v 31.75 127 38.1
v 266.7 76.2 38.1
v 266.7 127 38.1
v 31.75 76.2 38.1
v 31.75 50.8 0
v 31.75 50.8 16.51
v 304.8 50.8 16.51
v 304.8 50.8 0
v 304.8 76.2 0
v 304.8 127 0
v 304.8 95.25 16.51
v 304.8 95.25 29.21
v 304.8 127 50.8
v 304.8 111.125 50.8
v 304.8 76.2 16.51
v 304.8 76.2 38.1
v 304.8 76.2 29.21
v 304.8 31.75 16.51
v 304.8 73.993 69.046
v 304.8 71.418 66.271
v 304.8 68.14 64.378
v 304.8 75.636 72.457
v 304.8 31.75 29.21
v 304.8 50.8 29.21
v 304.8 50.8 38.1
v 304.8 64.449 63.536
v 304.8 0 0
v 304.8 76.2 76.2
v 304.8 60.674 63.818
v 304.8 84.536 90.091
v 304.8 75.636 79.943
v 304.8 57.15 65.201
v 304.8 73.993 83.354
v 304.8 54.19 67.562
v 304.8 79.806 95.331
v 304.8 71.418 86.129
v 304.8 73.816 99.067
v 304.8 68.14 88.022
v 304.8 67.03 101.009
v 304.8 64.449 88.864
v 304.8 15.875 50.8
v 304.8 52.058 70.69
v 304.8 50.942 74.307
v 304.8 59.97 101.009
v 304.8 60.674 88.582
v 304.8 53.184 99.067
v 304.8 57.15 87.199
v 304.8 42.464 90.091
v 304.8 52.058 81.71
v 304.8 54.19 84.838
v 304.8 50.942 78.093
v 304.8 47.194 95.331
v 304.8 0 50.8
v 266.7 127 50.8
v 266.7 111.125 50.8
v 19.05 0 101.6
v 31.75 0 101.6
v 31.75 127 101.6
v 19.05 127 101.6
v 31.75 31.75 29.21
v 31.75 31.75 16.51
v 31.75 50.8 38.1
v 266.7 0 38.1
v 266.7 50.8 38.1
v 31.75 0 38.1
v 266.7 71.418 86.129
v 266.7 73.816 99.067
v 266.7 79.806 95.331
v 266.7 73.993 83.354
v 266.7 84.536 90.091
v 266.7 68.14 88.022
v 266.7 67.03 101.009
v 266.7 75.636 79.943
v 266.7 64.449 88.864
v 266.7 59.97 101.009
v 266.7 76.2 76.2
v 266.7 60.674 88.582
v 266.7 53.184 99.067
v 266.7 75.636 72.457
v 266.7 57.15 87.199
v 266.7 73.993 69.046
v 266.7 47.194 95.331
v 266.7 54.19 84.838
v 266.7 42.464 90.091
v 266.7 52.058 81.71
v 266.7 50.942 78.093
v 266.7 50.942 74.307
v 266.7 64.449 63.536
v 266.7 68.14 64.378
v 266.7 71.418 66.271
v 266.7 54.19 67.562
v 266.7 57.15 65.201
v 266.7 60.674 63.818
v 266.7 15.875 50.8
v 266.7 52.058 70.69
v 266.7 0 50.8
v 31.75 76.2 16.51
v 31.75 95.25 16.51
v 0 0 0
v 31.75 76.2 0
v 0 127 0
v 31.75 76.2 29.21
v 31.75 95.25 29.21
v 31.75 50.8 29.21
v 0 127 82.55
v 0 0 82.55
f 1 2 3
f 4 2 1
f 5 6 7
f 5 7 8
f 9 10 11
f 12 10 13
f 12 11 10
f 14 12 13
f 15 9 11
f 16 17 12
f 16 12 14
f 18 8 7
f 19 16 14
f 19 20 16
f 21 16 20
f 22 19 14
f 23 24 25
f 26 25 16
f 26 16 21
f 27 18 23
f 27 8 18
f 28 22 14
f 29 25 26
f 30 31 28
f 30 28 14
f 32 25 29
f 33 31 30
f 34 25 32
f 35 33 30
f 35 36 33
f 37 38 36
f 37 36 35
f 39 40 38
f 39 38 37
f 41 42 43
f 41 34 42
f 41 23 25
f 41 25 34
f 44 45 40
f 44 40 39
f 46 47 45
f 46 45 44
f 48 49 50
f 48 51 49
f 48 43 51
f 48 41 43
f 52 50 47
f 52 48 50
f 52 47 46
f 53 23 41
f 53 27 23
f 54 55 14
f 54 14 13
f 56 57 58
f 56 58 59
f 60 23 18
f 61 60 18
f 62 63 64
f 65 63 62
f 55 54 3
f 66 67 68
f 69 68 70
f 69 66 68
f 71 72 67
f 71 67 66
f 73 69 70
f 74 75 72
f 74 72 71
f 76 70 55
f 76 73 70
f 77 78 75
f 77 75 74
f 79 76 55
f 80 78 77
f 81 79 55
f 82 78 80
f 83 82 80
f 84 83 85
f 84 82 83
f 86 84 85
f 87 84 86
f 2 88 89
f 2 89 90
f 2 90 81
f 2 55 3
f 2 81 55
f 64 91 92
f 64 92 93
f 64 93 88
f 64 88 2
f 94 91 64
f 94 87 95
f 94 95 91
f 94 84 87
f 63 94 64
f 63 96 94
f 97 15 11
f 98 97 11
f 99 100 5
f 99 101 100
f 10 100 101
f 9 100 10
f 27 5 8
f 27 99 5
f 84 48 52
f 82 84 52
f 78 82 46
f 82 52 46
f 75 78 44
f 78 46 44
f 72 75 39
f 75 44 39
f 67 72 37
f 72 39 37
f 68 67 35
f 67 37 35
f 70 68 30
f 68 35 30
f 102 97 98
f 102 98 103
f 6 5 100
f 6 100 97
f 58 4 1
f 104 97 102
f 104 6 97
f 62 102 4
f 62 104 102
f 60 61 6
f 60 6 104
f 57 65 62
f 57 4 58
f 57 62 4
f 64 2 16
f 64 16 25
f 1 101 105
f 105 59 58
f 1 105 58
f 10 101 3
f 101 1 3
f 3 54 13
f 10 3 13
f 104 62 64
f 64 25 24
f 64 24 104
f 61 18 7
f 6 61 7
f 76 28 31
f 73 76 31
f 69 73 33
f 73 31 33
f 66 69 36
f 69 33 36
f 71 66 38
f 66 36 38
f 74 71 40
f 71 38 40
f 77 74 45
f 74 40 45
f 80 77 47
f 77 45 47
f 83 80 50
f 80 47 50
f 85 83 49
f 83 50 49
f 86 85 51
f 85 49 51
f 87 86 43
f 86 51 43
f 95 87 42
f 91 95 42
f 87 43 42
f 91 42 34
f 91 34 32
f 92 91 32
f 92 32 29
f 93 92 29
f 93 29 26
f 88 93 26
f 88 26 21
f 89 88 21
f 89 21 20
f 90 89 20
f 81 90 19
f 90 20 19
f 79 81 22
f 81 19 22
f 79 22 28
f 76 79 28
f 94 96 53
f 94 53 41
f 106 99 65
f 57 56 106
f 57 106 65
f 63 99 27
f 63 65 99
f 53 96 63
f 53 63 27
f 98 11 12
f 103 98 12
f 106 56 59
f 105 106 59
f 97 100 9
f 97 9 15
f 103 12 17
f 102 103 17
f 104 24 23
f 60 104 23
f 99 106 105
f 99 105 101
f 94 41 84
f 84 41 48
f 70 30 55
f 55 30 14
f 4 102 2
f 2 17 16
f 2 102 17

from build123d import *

# Parameters (mm, degrees)
F0_W     = 38.1
F0_H     = 50.8
F1_DEPTH = 127
F2_SIZE2 = 19.05
F2_SIZE  = 19.05
F4_DEPTH = 273.05
F3_R     = 12.7
F5_DEPTH = 38.1
F6_DEPTH = 38.1


with BuildPart() as f1:
    # F0 (on Front) → F1 (new body)
    with BuildSketch(Plane.XZ):
        Polygon((0, 101.6), (0, 0), (304.8, 0), (304.8, 50.8), (266.7, 50.8), (266.7, 38.1), (31.75, 38.1), (31.75, 101.6), align=None)
        with Locations((285.75, 76.2)):
            Rectangle(F0_W, F0_H)
    extrude(amount=-F1_DEPTH)

    # F2
    f2_edges = [f1.edges().sort_by_distance(p)[0] for p in [
        (0, 63.5, 101.6),
    ]]
    chamfer(f2_edges, length=F2_SIZE, length2=F2_SIZE2)

    # F3 (on face) → F4 (cut, through all)
    with BuildSketch(Plane.YZ.offset(304.8)):
        Polygon((50.8, 16.51), (50.8, 0), (63.5, 0), (76.2, 0), (76.2, 16.51), (95.25, 16.51), (95.25, 29.21), (76.2, 29.21), (76.2, 38.1), (63.5, 38.1), (50.8, 38.1), (50.8, 29.21), (31.75, 29.21), (31.75, 16.51), align=None)
    extrude(amount=-F4_DEPTH, mode=Mode.SUBTRACT)

    # F3 (on face) → F5 (cut)
    with BuildSketch(Plane.YZ.offset(304.8)):
        with Locations((63.5, 76.2)):
            Circle(F3_R)
    extrude(amount=-F5_DEPTH, mode=Mode.SUBTRACT)

    # F3 (on face) → F6 (cut)
    with BuildSketch(Plane.YZ.offset(304.8)):
        with BuildLine():
            Line((0, 101.6), (0, 50.8))
            Line((0, 50.8), (15.875, 50.8))
            Line((15.875, 50.8), (42.463992, 90.091243))
            ThreePointArc((42.463992, 90.091243), (63.5, 101.255851), (84.536008, 90.091243))
            Line((84.536008, 90.091243), (111.125, 50.8))
            Line((111.125, 50.8), (127, 50.8))
            Line((127, 50.8), (127, 101.6))
            Line((127, 101.6), (0, 101.6))
        make_face()
    extrude(amount=-F6_DEPTH, mode=Mode.SUBTRACT)


solid = f1.part
